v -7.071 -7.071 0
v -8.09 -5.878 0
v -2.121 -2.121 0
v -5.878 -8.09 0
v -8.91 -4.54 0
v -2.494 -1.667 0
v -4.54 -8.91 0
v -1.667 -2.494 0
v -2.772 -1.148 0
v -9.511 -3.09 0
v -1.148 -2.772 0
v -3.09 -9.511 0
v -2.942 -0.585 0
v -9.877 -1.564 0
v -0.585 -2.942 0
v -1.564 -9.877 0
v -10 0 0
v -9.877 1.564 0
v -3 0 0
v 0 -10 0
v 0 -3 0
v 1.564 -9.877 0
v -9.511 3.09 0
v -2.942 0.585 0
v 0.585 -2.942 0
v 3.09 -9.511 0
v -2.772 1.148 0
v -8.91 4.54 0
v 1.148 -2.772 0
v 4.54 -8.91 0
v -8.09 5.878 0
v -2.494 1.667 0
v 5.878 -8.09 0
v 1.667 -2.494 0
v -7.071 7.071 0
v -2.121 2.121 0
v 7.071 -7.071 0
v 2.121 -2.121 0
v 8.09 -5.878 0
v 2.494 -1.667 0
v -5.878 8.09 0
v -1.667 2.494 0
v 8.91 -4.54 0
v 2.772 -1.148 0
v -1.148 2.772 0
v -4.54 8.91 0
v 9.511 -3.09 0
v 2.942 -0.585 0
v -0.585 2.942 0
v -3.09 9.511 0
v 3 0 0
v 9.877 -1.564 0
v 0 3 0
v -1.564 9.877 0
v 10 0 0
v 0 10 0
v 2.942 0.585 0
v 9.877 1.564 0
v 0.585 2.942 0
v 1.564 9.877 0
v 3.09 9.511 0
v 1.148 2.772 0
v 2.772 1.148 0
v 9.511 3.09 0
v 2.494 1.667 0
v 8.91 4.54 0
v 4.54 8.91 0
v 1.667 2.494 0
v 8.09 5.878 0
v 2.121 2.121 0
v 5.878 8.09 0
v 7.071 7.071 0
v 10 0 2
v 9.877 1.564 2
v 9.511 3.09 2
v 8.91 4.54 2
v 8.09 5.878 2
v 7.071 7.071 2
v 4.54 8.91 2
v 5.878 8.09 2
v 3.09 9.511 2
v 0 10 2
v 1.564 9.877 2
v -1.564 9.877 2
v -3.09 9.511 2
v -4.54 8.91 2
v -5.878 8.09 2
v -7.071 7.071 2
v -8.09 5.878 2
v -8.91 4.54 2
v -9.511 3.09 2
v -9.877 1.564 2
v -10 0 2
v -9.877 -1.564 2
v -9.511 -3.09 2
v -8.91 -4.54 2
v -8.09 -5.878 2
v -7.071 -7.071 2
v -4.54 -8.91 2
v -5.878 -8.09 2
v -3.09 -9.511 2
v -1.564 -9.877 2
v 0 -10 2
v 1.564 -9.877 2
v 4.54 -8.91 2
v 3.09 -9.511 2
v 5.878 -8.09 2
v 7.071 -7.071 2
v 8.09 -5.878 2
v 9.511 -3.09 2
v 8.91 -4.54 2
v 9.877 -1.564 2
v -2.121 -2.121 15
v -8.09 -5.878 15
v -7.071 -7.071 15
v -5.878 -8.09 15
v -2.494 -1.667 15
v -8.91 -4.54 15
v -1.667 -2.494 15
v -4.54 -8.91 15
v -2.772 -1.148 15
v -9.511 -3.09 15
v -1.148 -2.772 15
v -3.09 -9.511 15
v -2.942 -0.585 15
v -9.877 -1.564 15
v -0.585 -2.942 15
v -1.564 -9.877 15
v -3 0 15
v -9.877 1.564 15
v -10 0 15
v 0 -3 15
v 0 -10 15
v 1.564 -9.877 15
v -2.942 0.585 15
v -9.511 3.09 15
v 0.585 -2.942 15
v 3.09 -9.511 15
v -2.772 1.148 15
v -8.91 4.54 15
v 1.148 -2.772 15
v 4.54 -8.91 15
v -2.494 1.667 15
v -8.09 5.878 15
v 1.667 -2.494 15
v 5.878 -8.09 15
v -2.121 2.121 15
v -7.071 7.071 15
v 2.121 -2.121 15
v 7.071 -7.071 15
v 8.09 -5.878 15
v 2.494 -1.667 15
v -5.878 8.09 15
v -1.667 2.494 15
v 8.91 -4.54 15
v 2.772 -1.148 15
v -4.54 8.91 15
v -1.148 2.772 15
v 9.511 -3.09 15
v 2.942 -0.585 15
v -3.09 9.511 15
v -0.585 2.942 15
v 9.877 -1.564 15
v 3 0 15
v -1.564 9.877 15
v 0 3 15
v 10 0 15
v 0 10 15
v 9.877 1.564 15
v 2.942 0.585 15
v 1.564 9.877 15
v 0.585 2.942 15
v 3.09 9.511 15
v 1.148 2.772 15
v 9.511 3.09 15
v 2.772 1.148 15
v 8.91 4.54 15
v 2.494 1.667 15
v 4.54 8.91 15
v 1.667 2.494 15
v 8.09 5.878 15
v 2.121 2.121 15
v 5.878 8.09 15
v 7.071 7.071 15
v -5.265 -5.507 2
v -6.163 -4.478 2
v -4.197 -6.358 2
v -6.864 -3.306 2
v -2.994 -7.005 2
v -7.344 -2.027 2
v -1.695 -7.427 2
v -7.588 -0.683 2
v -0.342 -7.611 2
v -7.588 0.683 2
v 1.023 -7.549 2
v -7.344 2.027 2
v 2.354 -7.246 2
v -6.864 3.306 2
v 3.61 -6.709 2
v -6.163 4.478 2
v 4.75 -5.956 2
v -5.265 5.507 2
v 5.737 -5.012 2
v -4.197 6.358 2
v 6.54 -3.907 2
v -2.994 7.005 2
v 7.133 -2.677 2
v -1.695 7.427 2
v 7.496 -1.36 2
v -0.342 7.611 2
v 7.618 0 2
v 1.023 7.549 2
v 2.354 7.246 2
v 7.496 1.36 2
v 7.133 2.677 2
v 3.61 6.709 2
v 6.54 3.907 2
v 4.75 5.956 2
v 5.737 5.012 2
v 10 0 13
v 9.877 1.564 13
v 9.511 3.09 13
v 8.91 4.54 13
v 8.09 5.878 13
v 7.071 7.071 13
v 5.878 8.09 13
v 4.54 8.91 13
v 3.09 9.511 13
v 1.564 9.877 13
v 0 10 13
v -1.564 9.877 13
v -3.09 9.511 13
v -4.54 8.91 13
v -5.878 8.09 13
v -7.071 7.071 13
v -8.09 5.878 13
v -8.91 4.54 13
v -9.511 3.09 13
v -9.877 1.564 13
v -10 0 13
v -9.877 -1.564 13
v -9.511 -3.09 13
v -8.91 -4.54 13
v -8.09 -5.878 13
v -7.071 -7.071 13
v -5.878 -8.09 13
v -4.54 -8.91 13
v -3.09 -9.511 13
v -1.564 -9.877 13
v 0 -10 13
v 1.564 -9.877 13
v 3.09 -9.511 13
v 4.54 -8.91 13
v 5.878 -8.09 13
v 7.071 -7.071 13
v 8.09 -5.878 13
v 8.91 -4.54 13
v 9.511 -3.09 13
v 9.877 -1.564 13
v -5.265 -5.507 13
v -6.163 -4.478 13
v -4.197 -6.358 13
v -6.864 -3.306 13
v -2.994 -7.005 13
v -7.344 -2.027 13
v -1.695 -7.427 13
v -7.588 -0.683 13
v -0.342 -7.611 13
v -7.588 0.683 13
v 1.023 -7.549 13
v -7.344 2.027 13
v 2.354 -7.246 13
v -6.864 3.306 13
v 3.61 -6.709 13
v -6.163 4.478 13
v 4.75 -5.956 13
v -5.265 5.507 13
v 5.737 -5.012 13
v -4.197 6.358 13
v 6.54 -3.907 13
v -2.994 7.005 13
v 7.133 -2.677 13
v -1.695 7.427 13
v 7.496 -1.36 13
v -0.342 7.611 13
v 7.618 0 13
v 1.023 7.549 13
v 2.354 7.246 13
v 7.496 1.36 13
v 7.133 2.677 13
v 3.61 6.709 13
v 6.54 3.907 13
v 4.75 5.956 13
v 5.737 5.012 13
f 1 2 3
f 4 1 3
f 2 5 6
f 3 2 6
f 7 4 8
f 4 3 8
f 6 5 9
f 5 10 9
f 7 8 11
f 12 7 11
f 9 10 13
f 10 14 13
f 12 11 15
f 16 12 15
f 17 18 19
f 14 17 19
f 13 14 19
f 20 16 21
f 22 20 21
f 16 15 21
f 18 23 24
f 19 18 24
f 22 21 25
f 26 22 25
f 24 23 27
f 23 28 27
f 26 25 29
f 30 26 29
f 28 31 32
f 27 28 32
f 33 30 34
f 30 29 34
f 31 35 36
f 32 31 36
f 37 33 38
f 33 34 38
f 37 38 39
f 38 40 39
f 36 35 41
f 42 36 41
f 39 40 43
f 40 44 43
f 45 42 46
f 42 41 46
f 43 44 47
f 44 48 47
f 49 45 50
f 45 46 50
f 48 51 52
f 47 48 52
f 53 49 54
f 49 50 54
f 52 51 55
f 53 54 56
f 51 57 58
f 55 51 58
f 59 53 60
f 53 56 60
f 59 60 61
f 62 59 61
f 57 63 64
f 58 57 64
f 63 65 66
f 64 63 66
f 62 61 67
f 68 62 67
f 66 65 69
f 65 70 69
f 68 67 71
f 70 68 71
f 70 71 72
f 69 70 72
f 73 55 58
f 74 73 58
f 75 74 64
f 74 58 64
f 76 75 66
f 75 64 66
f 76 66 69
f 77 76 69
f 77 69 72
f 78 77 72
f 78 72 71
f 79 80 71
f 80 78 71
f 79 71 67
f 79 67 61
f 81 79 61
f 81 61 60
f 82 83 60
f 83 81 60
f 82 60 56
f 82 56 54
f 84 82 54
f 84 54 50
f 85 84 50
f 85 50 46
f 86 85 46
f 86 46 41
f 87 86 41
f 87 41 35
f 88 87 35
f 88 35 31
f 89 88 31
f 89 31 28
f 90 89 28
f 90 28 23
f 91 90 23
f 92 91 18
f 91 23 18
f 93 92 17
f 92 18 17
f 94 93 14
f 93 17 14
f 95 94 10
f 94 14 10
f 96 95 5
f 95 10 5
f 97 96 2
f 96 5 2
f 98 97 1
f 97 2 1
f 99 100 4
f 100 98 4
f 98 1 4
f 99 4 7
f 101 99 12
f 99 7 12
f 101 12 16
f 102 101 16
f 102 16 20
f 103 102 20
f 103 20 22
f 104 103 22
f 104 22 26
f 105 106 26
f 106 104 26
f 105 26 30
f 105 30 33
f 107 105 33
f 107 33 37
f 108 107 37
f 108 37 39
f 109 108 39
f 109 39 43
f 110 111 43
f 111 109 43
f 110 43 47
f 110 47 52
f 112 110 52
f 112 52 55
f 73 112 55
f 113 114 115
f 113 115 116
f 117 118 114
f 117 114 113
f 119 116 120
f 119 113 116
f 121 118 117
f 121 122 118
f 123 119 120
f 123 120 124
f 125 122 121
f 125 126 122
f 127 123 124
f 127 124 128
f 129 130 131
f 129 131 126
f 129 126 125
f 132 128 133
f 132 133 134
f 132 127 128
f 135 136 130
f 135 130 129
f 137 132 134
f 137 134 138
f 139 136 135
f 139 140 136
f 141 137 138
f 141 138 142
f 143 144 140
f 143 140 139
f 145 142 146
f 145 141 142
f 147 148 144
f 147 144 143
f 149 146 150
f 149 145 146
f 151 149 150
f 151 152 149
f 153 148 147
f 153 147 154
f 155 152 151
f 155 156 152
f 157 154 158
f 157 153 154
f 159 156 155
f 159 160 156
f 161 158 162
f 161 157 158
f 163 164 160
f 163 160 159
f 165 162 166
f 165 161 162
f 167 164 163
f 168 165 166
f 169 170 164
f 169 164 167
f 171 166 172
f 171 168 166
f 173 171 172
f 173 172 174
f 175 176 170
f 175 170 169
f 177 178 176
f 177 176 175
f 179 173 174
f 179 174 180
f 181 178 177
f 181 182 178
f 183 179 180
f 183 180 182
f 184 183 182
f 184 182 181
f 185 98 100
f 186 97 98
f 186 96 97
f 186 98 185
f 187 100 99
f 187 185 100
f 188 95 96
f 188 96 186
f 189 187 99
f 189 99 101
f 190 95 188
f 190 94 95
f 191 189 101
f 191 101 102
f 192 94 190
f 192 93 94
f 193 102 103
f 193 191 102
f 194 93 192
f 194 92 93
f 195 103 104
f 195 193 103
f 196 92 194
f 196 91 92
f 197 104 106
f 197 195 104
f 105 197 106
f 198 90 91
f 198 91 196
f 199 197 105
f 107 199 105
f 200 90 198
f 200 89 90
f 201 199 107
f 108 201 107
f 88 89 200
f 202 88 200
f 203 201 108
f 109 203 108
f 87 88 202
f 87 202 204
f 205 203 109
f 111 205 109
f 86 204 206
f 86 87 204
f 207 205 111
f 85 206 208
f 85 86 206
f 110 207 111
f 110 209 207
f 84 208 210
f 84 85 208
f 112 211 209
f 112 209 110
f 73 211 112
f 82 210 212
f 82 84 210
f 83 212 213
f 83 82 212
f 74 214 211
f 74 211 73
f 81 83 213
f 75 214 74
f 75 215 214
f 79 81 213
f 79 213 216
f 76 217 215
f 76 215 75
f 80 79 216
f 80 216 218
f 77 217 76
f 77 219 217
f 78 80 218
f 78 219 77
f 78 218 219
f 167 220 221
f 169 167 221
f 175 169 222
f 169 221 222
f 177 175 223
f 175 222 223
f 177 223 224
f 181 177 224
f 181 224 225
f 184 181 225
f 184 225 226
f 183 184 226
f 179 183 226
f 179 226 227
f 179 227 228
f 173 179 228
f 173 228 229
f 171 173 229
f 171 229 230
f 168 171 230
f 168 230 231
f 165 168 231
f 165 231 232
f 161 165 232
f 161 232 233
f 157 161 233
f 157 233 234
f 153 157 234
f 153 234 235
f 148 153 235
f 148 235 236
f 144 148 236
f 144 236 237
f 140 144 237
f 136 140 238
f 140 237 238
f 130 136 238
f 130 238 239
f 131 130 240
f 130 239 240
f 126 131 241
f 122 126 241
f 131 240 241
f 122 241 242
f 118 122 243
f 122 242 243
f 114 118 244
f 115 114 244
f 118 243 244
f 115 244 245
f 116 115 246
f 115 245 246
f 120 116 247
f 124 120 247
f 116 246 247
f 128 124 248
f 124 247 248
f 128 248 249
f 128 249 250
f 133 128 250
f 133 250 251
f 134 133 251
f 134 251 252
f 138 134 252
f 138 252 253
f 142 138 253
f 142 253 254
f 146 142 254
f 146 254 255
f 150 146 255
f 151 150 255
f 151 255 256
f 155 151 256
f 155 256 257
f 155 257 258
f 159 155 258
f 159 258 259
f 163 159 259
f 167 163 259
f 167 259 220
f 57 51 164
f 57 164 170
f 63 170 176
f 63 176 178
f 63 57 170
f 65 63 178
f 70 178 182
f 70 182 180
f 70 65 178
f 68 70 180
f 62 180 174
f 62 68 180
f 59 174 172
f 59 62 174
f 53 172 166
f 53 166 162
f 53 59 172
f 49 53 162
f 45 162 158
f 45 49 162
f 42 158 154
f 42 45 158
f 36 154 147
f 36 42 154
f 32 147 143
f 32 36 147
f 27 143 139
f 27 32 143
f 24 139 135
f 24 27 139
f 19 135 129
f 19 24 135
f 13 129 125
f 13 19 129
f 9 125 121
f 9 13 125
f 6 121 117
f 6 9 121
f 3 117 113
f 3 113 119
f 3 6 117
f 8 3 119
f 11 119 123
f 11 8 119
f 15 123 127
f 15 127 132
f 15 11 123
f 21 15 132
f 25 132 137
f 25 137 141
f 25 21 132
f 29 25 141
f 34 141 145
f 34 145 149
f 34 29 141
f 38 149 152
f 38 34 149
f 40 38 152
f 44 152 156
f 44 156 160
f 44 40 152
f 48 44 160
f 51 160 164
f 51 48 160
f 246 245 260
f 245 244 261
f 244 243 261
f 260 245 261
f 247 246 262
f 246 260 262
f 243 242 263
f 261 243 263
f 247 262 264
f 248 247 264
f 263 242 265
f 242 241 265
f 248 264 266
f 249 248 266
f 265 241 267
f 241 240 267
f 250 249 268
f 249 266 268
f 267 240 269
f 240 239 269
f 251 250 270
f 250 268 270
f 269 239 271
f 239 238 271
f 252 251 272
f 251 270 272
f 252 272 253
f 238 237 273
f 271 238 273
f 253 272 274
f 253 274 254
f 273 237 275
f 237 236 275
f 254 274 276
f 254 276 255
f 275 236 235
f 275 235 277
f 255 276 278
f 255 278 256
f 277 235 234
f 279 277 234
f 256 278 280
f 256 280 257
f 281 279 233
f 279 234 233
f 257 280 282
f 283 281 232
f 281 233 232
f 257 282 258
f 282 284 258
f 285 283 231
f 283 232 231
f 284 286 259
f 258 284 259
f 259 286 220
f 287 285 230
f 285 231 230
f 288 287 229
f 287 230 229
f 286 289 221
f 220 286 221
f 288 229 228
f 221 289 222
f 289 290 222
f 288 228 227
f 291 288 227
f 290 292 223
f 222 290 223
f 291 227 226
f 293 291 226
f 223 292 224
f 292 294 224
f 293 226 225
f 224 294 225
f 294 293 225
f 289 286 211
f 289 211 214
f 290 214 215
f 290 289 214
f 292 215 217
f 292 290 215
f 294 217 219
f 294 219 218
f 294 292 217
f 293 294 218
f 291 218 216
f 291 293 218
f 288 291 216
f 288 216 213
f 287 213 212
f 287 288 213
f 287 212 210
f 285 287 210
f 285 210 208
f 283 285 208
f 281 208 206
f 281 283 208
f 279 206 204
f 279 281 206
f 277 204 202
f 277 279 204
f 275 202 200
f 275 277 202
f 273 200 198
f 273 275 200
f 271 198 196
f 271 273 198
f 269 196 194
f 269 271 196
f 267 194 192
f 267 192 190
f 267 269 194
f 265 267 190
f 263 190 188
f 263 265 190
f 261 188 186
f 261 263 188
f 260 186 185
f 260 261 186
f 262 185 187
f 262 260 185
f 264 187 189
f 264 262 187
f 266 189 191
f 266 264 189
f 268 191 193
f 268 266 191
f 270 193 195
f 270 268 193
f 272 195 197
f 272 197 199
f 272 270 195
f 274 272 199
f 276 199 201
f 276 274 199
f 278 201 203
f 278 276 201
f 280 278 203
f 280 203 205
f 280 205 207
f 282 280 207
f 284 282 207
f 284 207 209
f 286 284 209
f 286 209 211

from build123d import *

# Parameters (mm, degrees)
SKETCH1_R           = 10
SKETCH1_R_2         = 3
BOSS_EXTRUDE1_DEPTH = 15
CUT_EXTRUDE1_START  = -2
SKETCH2_R           = 10.003270656
SKETCH2_R_2         = 7.618419173
CUT_EXTRUDE1_DEPTH  = 11


with BuildPart() as part:
    # Sketch1 → Boss-Extrude1 (new body)
    with BuildSketch(Plane.XY):
        Circle(SKETCH1_R)
        Circle(SKETCH1_R_2, mode=Mode.SUBTRACT)
    extrude(amount=BOSS_EXTRUDE1_DEPTH)

    # Sketch2 → Cut-Extrude1 (cut)
    with BuildSketch(Plane.XY.offset(15).offset(CUT_EXTRUDE1_START)):
        Circle(SKETCH2_R)
        Circle(SKETCH2_R_2, mode=Mode.SUBTRACT)
    extrude(amount=-CUT_EXTRUDE1_DEPTH, mode=Mode.SUBTRACT)


solid = part.part
